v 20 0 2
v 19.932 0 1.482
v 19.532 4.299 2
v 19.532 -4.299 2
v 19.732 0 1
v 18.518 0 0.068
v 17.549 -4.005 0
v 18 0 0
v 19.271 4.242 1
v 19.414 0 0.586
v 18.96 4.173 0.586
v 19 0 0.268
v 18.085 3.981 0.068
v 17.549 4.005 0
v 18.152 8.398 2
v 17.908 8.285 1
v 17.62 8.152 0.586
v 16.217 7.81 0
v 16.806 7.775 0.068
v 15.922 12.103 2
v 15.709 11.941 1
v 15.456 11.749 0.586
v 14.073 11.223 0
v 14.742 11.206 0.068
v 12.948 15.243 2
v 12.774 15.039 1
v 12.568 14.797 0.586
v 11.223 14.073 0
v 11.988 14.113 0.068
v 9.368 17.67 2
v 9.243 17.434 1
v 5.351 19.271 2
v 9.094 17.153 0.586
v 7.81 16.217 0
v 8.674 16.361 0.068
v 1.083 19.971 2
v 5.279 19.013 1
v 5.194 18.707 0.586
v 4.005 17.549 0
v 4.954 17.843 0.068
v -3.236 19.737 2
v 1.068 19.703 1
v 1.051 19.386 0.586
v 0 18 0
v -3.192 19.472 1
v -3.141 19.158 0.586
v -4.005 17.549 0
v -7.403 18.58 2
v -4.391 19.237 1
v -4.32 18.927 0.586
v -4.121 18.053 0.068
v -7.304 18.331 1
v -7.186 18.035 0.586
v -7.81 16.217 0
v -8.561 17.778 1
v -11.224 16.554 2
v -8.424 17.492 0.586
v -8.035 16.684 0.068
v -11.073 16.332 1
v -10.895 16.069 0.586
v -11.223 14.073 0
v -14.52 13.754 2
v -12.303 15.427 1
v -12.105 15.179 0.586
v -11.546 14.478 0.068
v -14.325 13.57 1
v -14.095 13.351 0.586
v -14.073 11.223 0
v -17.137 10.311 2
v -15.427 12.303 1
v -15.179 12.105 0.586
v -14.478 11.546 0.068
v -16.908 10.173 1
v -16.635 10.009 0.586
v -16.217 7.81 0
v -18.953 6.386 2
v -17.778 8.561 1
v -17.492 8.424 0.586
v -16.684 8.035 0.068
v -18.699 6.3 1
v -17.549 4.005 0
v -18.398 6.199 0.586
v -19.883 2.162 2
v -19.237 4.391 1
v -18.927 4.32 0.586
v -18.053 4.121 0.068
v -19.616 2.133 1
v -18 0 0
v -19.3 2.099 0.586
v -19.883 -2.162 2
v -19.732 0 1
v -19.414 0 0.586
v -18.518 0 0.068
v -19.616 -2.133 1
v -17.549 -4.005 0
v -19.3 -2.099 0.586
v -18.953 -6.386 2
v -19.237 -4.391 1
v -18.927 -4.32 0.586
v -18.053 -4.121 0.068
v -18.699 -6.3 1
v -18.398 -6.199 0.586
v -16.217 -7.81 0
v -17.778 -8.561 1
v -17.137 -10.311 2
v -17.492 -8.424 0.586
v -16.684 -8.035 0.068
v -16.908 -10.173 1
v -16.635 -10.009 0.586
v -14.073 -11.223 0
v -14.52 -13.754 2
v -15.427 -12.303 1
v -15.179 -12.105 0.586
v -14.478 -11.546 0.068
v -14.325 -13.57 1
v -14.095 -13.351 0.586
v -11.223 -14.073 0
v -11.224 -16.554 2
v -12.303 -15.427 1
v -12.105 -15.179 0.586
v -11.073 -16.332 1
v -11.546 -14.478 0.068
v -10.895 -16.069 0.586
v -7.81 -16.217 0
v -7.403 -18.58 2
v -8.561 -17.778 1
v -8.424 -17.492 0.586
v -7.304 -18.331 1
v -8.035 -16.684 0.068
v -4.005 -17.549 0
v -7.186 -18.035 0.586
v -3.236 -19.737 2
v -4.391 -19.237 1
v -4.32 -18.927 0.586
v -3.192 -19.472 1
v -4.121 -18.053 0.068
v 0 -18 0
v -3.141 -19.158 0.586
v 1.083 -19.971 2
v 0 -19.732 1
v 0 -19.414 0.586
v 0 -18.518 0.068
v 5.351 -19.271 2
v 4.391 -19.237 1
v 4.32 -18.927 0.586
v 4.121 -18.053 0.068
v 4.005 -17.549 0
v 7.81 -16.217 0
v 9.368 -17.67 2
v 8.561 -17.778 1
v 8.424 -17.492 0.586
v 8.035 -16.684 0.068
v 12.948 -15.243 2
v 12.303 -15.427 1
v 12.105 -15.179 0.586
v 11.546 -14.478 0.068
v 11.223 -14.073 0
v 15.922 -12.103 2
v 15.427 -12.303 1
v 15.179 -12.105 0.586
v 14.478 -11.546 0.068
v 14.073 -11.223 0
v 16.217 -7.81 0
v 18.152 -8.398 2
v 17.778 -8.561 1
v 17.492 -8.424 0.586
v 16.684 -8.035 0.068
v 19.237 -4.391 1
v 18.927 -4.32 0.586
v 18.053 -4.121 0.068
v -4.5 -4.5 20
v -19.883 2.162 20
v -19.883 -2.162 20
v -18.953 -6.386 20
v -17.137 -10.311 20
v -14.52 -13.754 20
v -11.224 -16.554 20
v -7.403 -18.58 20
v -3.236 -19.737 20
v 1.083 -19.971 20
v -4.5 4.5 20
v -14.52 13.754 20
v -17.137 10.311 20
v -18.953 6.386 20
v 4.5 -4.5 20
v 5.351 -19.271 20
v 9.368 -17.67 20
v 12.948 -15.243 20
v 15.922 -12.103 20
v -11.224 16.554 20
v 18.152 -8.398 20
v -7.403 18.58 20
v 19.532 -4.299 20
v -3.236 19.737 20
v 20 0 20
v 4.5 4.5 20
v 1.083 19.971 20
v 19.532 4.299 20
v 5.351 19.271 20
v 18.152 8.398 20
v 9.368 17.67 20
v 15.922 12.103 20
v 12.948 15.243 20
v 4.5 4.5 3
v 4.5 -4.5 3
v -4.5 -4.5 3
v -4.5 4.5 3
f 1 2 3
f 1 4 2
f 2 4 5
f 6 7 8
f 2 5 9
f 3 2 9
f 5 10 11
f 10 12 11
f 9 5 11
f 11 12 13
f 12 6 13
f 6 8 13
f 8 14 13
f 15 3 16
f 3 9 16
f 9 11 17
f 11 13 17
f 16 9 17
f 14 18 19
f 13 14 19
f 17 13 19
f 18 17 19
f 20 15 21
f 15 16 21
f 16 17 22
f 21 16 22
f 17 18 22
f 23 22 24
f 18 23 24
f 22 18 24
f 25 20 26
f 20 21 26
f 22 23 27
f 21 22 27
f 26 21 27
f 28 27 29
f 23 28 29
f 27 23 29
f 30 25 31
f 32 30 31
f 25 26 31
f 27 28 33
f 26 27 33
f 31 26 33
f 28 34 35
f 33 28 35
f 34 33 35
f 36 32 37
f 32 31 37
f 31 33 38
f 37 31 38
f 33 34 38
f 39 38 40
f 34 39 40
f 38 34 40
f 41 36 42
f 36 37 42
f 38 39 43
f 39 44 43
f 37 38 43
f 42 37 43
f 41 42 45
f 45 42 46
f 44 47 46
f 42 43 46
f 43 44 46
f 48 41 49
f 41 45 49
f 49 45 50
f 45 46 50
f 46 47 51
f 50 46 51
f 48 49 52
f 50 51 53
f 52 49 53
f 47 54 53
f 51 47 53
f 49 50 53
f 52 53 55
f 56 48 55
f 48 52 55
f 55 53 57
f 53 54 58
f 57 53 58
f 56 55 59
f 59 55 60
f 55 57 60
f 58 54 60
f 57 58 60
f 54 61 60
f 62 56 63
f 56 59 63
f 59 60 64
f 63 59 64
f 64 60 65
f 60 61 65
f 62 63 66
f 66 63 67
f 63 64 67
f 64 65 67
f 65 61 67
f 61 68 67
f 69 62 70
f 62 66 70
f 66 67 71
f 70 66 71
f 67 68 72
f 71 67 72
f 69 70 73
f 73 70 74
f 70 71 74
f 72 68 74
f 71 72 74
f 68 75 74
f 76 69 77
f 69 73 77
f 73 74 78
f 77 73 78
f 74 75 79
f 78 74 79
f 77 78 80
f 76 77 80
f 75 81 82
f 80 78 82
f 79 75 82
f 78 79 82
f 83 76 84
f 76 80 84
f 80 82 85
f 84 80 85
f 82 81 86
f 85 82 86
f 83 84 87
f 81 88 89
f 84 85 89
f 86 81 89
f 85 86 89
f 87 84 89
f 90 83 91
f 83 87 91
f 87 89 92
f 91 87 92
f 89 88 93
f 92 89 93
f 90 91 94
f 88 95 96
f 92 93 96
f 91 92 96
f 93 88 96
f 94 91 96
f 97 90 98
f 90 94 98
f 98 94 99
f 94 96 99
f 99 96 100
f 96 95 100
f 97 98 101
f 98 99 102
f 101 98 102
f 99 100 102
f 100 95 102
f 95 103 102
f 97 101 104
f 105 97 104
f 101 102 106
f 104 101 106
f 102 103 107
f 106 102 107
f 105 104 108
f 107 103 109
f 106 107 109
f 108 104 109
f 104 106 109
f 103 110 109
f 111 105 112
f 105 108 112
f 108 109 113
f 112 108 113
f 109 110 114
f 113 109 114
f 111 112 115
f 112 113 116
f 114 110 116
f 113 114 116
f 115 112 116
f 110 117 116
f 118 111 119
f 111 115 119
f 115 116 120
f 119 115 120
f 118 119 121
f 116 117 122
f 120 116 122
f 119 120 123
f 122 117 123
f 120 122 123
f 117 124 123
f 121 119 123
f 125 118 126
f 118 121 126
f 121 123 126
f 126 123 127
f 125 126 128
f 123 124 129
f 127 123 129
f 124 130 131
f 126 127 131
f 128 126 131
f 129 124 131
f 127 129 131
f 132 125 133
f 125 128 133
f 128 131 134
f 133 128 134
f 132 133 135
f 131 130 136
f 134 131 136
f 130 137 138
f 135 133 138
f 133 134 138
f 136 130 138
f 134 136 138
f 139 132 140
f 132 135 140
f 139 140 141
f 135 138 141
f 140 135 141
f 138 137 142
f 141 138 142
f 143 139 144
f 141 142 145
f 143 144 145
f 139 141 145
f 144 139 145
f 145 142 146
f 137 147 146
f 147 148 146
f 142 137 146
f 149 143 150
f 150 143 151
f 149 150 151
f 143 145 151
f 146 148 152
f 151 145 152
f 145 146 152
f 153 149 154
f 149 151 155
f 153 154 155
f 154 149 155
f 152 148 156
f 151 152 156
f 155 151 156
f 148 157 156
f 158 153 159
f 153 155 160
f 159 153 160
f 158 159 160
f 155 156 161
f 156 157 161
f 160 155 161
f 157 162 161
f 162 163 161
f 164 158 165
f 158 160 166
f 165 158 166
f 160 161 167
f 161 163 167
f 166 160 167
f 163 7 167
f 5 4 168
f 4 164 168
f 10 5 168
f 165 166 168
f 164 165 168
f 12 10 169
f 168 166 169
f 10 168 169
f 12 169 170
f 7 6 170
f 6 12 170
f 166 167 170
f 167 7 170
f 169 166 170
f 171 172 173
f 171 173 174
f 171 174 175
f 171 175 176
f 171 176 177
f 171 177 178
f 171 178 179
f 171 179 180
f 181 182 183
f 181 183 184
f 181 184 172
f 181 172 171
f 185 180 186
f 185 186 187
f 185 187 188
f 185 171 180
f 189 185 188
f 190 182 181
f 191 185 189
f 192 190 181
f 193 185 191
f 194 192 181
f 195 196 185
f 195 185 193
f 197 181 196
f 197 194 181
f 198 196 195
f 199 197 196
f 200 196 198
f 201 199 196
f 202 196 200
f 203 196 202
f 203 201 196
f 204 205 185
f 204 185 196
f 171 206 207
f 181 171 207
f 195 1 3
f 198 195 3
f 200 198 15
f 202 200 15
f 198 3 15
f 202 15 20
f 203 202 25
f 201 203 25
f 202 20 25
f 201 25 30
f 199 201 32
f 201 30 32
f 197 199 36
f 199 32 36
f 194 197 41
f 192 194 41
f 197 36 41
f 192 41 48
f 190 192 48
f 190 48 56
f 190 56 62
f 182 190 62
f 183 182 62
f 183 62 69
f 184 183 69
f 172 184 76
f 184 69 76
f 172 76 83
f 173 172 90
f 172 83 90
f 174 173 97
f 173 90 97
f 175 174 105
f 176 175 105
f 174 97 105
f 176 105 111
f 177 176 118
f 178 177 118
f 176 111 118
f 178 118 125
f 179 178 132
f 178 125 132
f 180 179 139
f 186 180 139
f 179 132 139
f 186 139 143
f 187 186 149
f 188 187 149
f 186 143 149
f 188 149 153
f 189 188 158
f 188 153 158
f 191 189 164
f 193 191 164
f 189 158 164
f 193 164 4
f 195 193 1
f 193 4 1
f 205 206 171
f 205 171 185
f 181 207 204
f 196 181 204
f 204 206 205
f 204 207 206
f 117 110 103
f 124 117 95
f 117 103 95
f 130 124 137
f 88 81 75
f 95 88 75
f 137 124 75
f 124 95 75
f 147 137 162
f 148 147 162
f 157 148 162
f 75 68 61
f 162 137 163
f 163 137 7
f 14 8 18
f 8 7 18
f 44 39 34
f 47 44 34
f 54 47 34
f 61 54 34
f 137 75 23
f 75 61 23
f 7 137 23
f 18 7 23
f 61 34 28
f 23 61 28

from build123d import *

# Parameters (mm, degrees)
F0_R     = 20
F0_W     = 9
F0_H     = 9
F1_DEPTH = 3
F2_DEPTH = 20
F3_R     = 2


with BuildPart() as f1:
    # F0 (on Top) → F1 (new body)
    with BuildSketch(Plane.XY):
        Circle(F0_R)
        Rectangle(F0_W, F0_H, mode=Mode.SUBTRACT)
        Rectangle(F0_W, F0_H)
    extrude(amount=F1_DEPTH)

    # F0 (on Top) → F2 (join)
    with BuildSketch(Plane.XY):
        Circle(F0_R)
        Rectangle(F0_W, F0_H, mode=Mode.SUBTRACT)
    extrude(amount=F2_DEPTH)

    # F3
    f3_edges = [f1.edges().sort_by_distance(p)[0] for p in [
        (-20, 0, 0),
    ]]
    fillet(f3_edges, radius=F3_R)


solid = f1.part
